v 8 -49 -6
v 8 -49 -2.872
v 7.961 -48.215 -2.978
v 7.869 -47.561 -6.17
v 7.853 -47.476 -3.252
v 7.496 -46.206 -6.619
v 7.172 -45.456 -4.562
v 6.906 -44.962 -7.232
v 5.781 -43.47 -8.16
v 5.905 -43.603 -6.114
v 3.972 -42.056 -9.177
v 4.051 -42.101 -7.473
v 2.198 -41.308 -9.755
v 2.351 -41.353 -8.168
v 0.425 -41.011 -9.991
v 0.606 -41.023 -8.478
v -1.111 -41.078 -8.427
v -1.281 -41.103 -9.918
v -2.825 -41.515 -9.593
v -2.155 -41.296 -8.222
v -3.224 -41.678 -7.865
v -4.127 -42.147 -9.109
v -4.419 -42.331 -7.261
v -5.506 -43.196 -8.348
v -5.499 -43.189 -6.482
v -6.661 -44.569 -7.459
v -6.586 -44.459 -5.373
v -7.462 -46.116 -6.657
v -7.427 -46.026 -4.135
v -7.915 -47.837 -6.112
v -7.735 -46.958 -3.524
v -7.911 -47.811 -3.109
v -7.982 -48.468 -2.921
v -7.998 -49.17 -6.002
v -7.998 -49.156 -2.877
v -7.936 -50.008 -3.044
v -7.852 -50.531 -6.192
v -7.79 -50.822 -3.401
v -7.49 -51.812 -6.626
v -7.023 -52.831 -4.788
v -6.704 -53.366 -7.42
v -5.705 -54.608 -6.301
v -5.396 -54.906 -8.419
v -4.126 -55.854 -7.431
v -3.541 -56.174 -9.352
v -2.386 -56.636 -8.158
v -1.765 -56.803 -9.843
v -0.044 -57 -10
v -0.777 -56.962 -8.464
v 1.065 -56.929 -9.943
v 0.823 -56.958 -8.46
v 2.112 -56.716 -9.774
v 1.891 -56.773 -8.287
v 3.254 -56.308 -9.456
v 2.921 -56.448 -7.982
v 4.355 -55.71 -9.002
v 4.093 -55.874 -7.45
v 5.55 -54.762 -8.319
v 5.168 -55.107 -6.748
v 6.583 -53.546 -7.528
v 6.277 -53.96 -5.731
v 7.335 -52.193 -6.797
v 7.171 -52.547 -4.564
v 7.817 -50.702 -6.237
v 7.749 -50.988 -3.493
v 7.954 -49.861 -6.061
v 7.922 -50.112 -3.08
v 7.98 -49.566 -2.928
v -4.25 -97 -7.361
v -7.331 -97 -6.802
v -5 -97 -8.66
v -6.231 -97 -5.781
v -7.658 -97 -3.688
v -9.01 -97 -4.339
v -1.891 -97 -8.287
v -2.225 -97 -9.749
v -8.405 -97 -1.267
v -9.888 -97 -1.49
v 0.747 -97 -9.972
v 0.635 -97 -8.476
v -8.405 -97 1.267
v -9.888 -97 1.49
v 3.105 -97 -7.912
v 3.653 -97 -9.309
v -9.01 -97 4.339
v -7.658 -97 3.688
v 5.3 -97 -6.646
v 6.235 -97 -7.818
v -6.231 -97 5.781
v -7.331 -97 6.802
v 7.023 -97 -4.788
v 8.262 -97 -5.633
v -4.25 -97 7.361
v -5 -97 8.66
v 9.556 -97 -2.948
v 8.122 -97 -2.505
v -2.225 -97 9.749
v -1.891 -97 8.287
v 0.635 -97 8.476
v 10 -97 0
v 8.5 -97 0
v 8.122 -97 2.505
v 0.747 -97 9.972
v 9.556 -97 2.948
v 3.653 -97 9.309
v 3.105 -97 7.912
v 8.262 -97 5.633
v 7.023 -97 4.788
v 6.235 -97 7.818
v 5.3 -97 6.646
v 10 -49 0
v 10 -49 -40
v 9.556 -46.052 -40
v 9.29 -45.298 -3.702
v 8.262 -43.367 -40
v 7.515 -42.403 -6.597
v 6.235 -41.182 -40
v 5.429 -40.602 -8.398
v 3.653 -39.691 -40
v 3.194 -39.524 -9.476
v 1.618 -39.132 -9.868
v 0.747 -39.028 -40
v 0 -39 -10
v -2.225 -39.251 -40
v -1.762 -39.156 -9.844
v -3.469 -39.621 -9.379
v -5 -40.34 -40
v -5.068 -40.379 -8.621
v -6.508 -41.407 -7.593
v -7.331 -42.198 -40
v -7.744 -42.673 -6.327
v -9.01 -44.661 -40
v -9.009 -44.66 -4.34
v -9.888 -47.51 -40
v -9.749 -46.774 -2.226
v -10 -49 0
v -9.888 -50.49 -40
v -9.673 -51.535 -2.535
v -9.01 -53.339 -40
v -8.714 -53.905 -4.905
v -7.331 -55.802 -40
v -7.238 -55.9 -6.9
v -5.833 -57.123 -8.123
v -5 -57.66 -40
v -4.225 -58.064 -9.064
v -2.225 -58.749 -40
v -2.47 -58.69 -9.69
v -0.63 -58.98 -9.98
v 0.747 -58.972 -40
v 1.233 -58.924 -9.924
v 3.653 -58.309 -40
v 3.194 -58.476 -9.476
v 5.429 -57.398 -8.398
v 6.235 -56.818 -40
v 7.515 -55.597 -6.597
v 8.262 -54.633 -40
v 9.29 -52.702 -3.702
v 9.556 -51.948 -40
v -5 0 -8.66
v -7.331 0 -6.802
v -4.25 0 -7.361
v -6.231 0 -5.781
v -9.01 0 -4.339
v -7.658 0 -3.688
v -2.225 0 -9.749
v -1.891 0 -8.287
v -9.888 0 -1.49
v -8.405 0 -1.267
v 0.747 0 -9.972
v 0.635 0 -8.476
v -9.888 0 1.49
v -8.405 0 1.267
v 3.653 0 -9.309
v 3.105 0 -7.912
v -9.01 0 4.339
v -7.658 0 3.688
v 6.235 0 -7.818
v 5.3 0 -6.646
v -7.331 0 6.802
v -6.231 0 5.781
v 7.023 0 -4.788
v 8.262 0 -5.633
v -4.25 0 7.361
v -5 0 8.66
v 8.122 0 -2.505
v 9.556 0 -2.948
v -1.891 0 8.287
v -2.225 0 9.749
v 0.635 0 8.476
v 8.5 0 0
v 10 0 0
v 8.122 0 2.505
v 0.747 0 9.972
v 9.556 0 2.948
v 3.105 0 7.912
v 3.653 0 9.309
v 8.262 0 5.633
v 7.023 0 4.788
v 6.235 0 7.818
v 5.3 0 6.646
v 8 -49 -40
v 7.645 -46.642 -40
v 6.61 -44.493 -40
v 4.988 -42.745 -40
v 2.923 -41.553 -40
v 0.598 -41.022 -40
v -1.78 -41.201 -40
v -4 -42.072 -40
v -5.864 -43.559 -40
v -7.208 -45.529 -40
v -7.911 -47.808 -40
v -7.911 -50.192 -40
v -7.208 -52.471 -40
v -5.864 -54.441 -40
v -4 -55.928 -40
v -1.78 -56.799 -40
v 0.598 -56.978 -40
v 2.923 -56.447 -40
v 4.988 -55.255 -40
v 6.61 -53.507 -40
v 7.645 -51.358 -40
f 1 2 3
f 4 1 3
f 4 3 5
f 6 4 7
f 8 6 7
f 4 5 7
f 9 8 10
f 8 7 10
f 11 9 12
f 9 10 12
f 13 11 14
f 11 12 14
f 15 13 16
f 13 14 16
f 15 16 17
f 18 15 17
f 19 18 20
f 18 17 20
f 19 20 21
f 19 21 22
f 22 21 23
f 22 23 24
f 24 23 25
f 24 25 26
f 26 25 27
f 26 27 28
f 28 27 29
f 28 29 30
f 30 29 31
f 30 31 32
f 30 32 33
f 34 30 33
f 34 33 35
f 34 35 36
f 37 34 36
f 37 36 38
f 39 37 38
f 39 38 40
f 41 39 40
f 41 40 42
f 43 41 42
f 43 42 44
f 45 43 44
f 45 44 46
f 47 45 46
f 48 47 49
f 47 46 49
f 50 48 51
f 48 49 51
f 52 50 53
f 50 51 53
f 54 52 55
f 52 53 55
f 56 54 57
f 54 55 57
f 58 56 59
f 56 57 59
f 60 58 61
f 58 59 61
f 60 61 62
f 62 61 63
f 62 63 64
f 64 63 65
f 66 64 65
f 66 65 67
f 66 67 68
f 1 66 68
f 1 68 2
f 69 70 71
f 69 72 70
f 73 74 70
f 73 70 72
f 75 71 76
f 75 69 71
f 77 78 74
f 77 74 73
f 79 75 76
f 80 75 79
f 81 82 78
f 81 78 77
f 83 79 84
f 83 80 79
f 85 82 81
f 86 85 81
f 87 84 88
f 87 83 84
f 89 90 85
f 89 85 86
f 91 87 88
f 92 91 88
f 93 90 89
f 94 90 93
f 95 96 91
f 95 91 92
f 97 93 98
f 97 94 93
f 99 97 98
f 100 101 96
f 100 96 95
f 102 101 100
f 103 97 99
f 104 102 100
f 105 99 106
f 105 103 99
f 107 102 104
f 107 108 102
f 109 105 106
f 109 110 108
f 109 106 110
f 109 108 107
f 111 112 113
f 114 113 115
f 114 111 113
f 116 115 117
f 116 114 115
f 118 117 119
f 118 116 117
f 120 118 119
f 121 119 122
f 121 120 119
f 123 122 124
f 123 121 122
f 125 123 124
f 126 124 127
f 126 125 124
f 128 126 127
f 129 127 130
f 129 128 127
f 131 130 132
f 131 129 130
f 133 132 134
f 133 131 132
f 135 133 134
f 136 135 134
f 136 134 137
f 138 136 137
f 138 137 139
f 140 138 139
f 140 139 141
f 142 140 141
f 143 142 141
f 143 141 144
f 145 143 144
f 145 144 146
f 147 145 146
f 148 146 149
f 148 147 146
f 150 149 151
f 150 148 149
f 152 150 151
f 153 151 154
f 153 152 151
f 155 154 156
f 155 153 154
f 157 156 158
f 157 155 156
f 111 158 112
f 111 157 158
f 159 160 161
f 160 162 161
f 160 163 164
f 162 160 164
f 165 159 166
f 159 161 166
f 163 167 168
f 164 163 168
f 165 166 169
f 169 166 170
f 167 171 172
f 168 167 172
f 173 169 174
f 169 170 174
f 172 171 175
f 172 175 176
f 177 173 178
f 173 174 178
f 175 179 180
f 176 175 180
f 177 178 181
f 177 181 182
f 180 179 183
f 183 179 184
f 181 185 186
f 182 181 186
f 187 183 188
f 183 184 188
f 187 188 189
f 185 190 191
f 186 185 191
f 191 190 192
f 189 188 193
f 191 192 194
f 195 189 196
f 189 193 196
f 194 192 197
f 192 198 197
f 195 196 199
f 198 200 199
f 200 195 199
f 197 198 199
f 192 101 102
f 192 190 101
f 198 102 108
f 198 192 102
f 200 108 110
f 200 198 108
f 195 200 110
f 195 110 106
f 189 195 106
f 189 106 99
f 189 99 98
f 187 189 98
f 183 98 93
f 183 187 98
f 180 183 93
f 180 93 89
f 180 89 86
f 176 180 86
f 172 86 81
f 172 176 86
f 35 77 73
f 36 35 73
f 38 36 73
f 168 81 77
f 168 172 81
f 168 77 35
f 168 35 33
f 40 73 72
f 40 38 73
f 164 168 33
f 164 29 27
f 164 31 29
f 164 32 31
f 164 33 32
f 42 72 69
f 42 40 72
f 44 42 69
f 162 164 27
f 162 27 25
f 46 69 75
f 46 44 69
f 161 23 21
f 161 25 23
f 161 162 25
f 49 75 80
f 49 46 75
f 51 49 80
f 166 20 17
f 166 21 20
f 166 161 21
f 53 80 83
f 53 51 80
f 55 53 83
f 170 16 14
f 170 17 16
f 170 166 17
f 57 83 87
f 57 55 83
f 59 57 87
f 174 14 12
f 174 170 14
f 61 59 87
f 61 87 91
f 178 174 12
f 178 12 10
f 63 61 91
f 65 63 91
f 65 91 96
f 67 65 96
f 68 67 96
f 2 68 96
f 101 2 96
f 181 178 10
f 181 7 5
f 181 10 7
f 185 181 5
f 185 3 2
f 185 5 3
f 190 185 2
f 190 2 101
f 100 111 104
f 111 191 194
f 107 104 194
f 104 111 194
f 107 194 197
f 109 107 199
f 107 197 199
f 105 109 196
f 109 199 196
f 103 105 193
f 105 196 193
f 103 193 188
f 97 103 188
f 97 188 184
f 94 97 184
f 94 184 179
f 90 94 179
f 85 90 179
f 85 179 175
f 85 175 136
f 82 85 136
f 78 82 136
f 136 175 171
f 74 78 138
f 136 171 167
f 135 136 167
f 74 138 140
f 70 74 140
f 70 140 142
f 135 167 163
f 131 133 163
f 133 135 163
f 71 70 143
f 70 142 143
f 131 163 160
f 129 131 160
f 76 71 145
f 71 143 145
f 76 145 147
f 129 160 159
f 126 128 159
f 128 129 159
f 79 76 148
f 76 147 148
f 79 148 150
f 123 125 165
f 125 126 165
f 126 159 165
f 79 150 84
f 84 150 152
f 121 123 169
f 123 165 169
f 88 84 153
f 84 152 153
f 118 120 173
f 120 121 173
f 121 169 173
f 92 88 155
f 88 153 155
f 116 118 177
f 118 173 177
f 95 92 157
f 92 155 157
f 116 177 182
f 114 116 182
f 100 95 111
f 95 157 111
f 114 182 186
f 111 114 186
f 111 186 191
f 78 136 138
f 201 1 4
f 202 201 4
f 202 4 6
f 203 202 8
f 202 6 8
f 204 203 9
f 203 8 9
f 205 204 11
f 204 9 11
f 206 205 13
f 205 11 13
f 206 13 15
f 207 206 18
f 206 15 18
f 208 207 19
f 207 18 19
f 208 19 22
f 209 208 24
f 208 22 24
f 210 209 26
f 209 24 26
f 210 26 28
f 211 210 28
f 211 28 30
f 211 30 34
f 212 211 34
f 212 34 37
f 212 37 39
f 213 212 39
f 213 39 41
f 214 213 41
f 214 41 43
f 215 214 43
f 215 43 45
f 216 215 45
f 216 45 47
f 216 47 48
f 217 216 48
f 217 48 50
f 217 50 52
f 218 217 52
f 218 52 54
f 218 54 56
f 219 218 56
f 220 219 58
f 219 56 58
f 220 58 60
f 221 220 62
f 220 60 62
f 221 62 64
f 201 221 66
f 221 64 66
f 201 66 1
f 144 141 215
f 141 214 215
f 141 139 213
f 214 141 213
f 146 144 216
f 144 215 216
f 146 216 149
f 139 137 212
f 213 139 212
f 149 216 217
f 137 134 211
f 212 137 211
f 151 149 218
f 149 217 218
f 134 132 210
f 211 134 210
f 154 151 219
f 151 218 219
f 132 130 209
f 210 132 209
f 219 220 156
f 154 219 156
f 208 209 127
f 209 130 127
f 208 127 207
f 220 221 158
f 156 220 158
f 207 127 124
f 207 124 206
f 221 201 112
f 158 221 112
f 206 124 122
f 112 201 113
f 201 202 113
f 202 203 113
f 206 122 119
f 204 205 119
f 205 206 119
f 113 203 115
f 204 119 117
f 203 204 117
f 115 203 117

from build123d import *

# Parameters (mm, degrees)
F0_R     = 10
F0_R_2   = 8.5
F1_DEPTH = 97
F2_R     = 10
F2_R_2   = 8
F3_DEPTH = 40
F4_R     = 8
F5_DEPTH = 59.3
F6_R     = 8.5
F7_DEPTH = 110


with BuildPart() as f1:
    # F0 (on Front) → F1 (new body)
    with BuildSketch(Plane.XZ):
        Circle(F0_R)
        Circle(F0_R_2, mode=Mode.SUBTRACT)
    extrude(amount=F1_DEPTH)

    # F2 (on Top) → F3 (join)
    with BuildSketch(Plane.XY):
        with Locations((0, -49)):
            Circle(F2_R)
        with Locations((0, -49)):
            Circle(F2_R_2, mode=Mode.SUBTRACT)
    extrude(amount=-F3_DEPTH)

    # F4 (on Top) → F5 (cut)
    with BuildSketch(Plane.XY):
        with Locations((0, -49)):
            Circle(F4_R)
    extrude(amount=-F5_DEPTH, mode=Mode.SUBTRACT)

    # F6 (on Front) → F7 (cut)
    with BuildSketch(Plane.XZ):
        Circle(F6_R)
    extrude(amount=F7_DEPTH, mode=Mode.SUBTRACT)


solid = f1.part
